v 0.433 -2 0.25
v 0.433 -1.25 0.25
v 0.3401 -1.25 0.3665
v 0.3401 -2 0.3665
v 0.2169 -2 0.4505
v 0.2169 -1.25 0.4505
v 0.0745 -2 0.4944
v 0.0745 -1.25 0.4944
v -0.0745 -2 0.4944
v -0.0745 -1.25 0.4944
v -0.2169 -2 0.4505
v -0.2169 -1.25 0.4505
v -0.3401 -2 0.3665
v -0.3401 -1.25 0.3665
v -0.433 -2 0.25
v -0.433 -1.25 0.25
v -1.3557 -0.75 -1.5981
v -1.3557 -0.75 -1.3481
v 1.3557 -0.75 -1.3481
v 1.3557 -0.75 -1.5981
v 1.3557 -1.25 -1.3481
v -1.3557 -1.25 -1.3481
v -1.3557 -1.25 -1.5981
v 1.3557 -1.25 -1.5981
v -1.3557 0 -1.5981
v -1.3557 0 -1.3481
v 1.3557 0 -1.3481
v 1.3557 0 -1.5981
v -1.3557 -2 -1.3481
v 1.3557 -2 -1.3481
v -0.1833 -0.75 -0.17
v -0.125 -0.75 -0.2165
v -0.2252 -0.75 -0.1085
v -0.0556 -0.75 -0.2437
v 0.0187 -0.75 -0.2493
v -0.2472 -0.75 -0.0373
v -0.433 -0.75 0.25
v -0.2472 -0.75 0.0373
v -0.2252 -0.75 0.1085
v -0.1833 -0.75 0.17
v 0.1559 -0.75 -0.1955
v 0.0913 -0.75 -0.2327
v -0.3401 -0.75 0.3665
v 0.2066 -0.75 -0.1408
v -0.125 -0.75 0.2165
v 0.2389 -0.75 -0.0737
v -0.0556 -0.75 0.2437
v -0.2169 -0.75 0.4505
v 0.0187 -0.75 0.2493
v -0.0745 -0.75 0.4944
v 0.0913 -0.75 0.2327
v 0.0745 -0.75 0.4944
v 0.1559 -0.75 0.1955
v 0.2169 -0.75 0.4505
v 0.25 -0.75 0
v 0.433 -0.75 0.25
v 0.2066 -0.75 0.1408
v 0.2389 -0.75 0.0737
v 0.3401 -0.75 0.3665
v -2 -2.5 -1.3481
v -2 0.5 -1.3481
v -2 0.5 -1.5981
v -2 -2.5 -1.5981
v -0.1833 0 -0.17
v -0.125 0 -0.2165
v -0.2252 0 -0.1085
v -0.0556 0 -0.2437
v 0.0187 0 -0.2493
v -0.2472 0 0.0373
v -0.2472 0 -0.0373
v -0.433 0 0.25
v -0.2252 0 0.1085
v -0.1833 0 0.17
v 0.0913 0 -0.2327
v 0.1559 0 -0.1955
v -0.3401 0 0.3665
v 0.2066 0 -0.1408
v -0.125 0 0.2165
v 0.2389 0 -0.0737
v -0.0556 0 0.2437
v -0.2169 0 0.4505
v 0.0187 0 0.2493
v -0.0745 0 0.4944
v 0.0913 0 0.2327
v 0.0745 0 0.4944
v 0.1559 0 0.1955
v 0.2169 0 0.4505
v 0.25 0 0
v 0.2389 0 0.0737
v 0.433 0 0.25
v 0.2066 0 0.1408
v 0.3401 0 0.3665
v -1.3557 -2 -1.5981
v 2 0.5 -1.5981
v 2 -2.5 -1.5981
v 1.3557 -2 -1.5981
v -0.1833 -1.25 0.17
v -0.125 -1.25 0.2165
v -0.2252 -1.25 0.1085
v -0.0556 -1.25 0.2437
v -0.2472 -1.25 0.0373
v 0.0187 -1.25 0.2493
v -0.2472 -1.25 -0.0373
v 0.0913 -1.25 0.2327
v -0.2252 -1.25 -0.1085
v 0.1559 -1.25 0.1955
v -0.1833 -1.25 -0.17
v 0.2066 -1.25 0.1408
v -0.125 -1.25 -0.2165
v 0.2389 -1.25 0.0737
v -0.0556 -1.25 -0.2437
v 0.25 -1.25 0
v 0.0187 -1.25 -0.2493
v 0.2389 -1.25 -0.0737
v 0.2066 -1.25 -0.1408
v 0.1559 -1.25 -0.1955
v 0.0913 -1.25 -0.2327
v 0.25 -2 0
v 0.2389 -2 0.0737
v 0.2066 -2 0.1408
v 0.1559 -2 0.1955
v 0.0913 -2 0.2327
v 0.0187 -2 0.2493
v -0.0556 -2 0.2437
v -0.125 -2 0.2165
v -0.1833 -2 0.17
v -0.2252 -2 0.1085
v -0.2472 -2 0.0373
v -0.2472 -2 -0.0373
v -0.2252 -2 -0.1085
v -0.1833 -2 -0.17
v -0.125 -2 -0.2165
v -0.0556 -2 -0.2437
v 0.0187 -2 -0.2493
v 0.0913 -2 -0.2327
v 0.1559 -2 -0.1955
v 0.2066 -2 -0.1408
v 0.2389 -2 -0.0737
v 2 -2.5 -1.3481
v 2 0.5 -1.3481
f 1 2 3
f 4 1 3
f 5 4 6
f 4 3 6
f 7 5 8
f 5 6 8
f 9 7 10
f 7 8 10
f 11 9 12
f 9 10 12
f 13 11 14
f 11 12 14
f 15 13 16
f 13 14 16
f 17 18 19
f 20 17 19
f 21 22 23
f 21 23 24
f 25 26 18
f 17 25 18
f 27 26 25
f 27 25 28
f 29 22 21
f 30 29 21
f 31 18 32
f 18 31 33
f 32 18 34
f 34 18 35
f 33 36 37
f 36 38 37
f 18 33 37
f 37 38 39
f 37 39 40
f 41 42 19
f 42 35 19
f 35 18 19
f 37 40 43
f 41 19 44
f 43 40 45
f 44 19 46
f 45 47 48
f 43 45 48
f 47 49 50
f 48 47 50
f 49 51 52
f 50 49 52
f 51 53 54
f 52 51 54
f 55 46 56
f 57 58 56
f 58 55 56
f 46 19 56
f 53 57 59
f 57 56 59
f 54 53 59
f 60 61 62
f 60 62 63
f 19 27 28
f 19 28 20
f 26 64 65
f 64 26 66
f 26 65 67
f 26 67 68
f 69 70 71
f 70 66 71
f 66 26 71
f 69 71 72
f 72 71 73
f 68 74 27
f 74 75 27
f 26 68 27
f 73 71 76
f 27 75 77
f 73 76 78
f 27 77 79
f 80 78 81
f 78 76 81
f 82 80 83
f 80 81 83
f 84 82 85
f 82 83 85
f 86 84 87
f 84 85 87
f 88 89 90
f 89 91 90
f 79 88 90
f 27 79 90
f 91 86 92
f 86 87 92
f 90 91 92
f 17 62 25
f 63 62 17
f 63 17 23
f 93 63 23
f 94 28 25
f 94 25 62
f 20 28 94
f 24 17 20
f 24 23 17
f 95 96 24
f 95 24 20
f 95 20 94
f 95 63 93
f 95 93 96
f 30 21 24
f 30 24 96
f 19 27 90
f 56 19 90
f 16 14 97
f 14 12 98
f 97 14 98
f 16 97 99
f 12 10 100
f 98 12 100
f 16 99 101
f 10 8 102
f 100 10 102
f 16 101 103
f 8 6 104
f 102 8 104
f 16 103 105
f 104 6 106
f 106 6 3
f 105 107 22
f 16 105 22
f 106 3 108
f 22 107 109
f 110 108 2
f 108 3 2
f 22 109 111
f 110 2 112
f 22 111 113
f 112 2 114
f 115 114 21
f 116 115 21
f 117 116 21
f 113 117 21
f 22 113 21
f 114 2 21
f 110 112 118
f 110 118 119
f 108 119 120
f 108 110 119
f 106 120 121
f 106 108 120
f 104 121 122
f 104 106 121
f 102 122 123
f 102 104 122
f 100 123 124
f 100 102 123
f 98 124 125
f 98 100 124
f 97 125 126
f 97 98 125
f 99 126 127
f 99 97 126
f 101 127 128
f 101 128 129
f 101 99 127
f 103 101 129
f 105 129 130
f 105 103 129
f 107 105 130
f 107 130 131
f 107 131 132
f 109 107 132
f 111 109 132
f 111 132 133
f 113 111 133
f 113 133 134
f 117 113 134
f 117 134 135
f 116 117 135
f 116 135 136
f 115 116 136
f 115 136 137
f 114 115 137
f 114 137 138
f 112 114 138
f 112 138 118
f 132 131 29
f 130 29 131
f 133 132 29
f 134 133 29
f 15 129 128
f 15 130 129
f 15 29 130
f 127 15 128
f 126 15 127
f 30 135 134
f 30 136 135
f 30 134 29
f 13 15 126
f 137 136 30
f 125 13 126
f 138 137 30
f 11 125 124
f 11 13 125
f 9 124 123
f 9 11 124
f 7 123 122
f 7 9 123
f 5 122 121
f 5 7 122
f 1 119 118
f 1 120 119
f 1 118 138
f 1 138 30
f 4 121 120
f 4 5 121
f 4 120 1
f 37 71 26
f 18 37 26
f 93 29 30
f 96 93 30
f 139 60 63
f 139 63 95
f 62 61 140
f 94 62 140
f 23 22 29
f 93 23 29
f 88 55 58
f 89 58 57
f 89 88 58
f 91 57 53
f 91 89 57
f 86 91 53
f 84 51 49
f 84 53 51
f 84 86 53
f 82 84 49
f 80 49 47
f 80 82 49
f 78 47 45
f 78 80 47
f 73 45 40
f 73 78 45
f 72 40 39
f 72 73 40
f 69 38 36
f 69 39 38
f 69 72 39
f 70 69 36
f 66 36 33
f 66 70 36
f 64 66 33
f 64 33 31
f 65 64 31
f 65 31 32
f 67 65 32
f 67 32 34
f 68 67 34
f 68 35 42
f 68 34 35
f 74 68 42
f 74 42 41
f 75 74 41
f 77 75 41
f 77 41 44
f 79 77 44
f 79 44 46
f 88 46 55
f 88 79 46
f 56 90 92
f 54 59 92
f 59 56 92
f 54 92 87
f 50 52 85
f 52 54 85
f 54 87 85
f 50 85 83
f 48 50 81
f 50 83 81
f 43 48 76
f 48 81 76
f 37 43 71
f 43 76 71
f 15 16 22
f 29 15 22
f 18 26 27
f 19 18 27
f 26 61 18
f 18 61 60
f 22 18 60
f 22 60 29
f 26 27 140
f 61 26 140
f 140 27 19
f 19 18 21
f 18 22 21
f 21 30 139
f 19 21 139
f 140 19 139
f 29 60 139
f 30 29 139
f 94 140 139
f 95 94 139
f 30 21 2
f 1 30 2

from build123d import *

# Parameters (mm, degrees)
F0_R     = 0.25
F1_DEPTH = 2
F2_W     = 0.5
F2_H     = 1.5980762114
F3_DEPTH = 12.5
F4_W     = 4
F4_H     = 3
F4_W_2   = 2.7113248654
F4_H_2   = 0.75
F5_DEPTH = 0.25


with BuildPart() as f1:
    # F0 (on Front) → F1 (new body)
    with BuildSketch(Plane.XZ):
        with BuildLine():
            ThreePointArc((0.4330127019, 0.25), (0, 0.5), (-0.4330127019, 0.25))
            Line((-0.4330127019, 0.25), (-1.3556624327, -1.3480762114))
            Line((-1.3556624327, -1.3480762114), (1.3556624327, -1.3480762114))
            Line((1.3556624327, -1.3480762114), (0.4330127019, 0.25))
        make_face()
        Circle(F0_R, mode=Mode.SUBTRACT)
    extrude(amount=F1_DEPTH)

    # F2 (on Right) → F3 (cut, symmetric)
    with BuildSketch(Plane.YZ):
        with Locations((-1, 1.0490381057)):
            Rectangle(F2_W, F2_H)
        with Locations((-1, -0.5490381057)):
            Rectangle(F2_W, F2_H)
    extrude(amount=F3_DEPTH, both=True, mode=Mode.SUBTRACT)


with BuildPart() as f5:
    # F4 (on face) → F5 (new body)
    with BuildSketch(Plane(origin=(0, 0, -1.3480762114), x_dir=(1, 0, 0), z_dir=(0, 0, -1))):
        with Locations((0, 1)):
            Rectangle(F4_W, F4_H)
        with Locations((0, 0.375)):
            Rectangle(F4_W_2, F4_H_2, mode=Mode.SUBTRACT)
        with Locations((0, 1.625)):
            Rectangle(F4_W_2, F4_H_2, mode=Mode.SUBTRACT)
    extrude(amount=F5_DEPTH)


solid = Compound([f1.part, f5.part])
